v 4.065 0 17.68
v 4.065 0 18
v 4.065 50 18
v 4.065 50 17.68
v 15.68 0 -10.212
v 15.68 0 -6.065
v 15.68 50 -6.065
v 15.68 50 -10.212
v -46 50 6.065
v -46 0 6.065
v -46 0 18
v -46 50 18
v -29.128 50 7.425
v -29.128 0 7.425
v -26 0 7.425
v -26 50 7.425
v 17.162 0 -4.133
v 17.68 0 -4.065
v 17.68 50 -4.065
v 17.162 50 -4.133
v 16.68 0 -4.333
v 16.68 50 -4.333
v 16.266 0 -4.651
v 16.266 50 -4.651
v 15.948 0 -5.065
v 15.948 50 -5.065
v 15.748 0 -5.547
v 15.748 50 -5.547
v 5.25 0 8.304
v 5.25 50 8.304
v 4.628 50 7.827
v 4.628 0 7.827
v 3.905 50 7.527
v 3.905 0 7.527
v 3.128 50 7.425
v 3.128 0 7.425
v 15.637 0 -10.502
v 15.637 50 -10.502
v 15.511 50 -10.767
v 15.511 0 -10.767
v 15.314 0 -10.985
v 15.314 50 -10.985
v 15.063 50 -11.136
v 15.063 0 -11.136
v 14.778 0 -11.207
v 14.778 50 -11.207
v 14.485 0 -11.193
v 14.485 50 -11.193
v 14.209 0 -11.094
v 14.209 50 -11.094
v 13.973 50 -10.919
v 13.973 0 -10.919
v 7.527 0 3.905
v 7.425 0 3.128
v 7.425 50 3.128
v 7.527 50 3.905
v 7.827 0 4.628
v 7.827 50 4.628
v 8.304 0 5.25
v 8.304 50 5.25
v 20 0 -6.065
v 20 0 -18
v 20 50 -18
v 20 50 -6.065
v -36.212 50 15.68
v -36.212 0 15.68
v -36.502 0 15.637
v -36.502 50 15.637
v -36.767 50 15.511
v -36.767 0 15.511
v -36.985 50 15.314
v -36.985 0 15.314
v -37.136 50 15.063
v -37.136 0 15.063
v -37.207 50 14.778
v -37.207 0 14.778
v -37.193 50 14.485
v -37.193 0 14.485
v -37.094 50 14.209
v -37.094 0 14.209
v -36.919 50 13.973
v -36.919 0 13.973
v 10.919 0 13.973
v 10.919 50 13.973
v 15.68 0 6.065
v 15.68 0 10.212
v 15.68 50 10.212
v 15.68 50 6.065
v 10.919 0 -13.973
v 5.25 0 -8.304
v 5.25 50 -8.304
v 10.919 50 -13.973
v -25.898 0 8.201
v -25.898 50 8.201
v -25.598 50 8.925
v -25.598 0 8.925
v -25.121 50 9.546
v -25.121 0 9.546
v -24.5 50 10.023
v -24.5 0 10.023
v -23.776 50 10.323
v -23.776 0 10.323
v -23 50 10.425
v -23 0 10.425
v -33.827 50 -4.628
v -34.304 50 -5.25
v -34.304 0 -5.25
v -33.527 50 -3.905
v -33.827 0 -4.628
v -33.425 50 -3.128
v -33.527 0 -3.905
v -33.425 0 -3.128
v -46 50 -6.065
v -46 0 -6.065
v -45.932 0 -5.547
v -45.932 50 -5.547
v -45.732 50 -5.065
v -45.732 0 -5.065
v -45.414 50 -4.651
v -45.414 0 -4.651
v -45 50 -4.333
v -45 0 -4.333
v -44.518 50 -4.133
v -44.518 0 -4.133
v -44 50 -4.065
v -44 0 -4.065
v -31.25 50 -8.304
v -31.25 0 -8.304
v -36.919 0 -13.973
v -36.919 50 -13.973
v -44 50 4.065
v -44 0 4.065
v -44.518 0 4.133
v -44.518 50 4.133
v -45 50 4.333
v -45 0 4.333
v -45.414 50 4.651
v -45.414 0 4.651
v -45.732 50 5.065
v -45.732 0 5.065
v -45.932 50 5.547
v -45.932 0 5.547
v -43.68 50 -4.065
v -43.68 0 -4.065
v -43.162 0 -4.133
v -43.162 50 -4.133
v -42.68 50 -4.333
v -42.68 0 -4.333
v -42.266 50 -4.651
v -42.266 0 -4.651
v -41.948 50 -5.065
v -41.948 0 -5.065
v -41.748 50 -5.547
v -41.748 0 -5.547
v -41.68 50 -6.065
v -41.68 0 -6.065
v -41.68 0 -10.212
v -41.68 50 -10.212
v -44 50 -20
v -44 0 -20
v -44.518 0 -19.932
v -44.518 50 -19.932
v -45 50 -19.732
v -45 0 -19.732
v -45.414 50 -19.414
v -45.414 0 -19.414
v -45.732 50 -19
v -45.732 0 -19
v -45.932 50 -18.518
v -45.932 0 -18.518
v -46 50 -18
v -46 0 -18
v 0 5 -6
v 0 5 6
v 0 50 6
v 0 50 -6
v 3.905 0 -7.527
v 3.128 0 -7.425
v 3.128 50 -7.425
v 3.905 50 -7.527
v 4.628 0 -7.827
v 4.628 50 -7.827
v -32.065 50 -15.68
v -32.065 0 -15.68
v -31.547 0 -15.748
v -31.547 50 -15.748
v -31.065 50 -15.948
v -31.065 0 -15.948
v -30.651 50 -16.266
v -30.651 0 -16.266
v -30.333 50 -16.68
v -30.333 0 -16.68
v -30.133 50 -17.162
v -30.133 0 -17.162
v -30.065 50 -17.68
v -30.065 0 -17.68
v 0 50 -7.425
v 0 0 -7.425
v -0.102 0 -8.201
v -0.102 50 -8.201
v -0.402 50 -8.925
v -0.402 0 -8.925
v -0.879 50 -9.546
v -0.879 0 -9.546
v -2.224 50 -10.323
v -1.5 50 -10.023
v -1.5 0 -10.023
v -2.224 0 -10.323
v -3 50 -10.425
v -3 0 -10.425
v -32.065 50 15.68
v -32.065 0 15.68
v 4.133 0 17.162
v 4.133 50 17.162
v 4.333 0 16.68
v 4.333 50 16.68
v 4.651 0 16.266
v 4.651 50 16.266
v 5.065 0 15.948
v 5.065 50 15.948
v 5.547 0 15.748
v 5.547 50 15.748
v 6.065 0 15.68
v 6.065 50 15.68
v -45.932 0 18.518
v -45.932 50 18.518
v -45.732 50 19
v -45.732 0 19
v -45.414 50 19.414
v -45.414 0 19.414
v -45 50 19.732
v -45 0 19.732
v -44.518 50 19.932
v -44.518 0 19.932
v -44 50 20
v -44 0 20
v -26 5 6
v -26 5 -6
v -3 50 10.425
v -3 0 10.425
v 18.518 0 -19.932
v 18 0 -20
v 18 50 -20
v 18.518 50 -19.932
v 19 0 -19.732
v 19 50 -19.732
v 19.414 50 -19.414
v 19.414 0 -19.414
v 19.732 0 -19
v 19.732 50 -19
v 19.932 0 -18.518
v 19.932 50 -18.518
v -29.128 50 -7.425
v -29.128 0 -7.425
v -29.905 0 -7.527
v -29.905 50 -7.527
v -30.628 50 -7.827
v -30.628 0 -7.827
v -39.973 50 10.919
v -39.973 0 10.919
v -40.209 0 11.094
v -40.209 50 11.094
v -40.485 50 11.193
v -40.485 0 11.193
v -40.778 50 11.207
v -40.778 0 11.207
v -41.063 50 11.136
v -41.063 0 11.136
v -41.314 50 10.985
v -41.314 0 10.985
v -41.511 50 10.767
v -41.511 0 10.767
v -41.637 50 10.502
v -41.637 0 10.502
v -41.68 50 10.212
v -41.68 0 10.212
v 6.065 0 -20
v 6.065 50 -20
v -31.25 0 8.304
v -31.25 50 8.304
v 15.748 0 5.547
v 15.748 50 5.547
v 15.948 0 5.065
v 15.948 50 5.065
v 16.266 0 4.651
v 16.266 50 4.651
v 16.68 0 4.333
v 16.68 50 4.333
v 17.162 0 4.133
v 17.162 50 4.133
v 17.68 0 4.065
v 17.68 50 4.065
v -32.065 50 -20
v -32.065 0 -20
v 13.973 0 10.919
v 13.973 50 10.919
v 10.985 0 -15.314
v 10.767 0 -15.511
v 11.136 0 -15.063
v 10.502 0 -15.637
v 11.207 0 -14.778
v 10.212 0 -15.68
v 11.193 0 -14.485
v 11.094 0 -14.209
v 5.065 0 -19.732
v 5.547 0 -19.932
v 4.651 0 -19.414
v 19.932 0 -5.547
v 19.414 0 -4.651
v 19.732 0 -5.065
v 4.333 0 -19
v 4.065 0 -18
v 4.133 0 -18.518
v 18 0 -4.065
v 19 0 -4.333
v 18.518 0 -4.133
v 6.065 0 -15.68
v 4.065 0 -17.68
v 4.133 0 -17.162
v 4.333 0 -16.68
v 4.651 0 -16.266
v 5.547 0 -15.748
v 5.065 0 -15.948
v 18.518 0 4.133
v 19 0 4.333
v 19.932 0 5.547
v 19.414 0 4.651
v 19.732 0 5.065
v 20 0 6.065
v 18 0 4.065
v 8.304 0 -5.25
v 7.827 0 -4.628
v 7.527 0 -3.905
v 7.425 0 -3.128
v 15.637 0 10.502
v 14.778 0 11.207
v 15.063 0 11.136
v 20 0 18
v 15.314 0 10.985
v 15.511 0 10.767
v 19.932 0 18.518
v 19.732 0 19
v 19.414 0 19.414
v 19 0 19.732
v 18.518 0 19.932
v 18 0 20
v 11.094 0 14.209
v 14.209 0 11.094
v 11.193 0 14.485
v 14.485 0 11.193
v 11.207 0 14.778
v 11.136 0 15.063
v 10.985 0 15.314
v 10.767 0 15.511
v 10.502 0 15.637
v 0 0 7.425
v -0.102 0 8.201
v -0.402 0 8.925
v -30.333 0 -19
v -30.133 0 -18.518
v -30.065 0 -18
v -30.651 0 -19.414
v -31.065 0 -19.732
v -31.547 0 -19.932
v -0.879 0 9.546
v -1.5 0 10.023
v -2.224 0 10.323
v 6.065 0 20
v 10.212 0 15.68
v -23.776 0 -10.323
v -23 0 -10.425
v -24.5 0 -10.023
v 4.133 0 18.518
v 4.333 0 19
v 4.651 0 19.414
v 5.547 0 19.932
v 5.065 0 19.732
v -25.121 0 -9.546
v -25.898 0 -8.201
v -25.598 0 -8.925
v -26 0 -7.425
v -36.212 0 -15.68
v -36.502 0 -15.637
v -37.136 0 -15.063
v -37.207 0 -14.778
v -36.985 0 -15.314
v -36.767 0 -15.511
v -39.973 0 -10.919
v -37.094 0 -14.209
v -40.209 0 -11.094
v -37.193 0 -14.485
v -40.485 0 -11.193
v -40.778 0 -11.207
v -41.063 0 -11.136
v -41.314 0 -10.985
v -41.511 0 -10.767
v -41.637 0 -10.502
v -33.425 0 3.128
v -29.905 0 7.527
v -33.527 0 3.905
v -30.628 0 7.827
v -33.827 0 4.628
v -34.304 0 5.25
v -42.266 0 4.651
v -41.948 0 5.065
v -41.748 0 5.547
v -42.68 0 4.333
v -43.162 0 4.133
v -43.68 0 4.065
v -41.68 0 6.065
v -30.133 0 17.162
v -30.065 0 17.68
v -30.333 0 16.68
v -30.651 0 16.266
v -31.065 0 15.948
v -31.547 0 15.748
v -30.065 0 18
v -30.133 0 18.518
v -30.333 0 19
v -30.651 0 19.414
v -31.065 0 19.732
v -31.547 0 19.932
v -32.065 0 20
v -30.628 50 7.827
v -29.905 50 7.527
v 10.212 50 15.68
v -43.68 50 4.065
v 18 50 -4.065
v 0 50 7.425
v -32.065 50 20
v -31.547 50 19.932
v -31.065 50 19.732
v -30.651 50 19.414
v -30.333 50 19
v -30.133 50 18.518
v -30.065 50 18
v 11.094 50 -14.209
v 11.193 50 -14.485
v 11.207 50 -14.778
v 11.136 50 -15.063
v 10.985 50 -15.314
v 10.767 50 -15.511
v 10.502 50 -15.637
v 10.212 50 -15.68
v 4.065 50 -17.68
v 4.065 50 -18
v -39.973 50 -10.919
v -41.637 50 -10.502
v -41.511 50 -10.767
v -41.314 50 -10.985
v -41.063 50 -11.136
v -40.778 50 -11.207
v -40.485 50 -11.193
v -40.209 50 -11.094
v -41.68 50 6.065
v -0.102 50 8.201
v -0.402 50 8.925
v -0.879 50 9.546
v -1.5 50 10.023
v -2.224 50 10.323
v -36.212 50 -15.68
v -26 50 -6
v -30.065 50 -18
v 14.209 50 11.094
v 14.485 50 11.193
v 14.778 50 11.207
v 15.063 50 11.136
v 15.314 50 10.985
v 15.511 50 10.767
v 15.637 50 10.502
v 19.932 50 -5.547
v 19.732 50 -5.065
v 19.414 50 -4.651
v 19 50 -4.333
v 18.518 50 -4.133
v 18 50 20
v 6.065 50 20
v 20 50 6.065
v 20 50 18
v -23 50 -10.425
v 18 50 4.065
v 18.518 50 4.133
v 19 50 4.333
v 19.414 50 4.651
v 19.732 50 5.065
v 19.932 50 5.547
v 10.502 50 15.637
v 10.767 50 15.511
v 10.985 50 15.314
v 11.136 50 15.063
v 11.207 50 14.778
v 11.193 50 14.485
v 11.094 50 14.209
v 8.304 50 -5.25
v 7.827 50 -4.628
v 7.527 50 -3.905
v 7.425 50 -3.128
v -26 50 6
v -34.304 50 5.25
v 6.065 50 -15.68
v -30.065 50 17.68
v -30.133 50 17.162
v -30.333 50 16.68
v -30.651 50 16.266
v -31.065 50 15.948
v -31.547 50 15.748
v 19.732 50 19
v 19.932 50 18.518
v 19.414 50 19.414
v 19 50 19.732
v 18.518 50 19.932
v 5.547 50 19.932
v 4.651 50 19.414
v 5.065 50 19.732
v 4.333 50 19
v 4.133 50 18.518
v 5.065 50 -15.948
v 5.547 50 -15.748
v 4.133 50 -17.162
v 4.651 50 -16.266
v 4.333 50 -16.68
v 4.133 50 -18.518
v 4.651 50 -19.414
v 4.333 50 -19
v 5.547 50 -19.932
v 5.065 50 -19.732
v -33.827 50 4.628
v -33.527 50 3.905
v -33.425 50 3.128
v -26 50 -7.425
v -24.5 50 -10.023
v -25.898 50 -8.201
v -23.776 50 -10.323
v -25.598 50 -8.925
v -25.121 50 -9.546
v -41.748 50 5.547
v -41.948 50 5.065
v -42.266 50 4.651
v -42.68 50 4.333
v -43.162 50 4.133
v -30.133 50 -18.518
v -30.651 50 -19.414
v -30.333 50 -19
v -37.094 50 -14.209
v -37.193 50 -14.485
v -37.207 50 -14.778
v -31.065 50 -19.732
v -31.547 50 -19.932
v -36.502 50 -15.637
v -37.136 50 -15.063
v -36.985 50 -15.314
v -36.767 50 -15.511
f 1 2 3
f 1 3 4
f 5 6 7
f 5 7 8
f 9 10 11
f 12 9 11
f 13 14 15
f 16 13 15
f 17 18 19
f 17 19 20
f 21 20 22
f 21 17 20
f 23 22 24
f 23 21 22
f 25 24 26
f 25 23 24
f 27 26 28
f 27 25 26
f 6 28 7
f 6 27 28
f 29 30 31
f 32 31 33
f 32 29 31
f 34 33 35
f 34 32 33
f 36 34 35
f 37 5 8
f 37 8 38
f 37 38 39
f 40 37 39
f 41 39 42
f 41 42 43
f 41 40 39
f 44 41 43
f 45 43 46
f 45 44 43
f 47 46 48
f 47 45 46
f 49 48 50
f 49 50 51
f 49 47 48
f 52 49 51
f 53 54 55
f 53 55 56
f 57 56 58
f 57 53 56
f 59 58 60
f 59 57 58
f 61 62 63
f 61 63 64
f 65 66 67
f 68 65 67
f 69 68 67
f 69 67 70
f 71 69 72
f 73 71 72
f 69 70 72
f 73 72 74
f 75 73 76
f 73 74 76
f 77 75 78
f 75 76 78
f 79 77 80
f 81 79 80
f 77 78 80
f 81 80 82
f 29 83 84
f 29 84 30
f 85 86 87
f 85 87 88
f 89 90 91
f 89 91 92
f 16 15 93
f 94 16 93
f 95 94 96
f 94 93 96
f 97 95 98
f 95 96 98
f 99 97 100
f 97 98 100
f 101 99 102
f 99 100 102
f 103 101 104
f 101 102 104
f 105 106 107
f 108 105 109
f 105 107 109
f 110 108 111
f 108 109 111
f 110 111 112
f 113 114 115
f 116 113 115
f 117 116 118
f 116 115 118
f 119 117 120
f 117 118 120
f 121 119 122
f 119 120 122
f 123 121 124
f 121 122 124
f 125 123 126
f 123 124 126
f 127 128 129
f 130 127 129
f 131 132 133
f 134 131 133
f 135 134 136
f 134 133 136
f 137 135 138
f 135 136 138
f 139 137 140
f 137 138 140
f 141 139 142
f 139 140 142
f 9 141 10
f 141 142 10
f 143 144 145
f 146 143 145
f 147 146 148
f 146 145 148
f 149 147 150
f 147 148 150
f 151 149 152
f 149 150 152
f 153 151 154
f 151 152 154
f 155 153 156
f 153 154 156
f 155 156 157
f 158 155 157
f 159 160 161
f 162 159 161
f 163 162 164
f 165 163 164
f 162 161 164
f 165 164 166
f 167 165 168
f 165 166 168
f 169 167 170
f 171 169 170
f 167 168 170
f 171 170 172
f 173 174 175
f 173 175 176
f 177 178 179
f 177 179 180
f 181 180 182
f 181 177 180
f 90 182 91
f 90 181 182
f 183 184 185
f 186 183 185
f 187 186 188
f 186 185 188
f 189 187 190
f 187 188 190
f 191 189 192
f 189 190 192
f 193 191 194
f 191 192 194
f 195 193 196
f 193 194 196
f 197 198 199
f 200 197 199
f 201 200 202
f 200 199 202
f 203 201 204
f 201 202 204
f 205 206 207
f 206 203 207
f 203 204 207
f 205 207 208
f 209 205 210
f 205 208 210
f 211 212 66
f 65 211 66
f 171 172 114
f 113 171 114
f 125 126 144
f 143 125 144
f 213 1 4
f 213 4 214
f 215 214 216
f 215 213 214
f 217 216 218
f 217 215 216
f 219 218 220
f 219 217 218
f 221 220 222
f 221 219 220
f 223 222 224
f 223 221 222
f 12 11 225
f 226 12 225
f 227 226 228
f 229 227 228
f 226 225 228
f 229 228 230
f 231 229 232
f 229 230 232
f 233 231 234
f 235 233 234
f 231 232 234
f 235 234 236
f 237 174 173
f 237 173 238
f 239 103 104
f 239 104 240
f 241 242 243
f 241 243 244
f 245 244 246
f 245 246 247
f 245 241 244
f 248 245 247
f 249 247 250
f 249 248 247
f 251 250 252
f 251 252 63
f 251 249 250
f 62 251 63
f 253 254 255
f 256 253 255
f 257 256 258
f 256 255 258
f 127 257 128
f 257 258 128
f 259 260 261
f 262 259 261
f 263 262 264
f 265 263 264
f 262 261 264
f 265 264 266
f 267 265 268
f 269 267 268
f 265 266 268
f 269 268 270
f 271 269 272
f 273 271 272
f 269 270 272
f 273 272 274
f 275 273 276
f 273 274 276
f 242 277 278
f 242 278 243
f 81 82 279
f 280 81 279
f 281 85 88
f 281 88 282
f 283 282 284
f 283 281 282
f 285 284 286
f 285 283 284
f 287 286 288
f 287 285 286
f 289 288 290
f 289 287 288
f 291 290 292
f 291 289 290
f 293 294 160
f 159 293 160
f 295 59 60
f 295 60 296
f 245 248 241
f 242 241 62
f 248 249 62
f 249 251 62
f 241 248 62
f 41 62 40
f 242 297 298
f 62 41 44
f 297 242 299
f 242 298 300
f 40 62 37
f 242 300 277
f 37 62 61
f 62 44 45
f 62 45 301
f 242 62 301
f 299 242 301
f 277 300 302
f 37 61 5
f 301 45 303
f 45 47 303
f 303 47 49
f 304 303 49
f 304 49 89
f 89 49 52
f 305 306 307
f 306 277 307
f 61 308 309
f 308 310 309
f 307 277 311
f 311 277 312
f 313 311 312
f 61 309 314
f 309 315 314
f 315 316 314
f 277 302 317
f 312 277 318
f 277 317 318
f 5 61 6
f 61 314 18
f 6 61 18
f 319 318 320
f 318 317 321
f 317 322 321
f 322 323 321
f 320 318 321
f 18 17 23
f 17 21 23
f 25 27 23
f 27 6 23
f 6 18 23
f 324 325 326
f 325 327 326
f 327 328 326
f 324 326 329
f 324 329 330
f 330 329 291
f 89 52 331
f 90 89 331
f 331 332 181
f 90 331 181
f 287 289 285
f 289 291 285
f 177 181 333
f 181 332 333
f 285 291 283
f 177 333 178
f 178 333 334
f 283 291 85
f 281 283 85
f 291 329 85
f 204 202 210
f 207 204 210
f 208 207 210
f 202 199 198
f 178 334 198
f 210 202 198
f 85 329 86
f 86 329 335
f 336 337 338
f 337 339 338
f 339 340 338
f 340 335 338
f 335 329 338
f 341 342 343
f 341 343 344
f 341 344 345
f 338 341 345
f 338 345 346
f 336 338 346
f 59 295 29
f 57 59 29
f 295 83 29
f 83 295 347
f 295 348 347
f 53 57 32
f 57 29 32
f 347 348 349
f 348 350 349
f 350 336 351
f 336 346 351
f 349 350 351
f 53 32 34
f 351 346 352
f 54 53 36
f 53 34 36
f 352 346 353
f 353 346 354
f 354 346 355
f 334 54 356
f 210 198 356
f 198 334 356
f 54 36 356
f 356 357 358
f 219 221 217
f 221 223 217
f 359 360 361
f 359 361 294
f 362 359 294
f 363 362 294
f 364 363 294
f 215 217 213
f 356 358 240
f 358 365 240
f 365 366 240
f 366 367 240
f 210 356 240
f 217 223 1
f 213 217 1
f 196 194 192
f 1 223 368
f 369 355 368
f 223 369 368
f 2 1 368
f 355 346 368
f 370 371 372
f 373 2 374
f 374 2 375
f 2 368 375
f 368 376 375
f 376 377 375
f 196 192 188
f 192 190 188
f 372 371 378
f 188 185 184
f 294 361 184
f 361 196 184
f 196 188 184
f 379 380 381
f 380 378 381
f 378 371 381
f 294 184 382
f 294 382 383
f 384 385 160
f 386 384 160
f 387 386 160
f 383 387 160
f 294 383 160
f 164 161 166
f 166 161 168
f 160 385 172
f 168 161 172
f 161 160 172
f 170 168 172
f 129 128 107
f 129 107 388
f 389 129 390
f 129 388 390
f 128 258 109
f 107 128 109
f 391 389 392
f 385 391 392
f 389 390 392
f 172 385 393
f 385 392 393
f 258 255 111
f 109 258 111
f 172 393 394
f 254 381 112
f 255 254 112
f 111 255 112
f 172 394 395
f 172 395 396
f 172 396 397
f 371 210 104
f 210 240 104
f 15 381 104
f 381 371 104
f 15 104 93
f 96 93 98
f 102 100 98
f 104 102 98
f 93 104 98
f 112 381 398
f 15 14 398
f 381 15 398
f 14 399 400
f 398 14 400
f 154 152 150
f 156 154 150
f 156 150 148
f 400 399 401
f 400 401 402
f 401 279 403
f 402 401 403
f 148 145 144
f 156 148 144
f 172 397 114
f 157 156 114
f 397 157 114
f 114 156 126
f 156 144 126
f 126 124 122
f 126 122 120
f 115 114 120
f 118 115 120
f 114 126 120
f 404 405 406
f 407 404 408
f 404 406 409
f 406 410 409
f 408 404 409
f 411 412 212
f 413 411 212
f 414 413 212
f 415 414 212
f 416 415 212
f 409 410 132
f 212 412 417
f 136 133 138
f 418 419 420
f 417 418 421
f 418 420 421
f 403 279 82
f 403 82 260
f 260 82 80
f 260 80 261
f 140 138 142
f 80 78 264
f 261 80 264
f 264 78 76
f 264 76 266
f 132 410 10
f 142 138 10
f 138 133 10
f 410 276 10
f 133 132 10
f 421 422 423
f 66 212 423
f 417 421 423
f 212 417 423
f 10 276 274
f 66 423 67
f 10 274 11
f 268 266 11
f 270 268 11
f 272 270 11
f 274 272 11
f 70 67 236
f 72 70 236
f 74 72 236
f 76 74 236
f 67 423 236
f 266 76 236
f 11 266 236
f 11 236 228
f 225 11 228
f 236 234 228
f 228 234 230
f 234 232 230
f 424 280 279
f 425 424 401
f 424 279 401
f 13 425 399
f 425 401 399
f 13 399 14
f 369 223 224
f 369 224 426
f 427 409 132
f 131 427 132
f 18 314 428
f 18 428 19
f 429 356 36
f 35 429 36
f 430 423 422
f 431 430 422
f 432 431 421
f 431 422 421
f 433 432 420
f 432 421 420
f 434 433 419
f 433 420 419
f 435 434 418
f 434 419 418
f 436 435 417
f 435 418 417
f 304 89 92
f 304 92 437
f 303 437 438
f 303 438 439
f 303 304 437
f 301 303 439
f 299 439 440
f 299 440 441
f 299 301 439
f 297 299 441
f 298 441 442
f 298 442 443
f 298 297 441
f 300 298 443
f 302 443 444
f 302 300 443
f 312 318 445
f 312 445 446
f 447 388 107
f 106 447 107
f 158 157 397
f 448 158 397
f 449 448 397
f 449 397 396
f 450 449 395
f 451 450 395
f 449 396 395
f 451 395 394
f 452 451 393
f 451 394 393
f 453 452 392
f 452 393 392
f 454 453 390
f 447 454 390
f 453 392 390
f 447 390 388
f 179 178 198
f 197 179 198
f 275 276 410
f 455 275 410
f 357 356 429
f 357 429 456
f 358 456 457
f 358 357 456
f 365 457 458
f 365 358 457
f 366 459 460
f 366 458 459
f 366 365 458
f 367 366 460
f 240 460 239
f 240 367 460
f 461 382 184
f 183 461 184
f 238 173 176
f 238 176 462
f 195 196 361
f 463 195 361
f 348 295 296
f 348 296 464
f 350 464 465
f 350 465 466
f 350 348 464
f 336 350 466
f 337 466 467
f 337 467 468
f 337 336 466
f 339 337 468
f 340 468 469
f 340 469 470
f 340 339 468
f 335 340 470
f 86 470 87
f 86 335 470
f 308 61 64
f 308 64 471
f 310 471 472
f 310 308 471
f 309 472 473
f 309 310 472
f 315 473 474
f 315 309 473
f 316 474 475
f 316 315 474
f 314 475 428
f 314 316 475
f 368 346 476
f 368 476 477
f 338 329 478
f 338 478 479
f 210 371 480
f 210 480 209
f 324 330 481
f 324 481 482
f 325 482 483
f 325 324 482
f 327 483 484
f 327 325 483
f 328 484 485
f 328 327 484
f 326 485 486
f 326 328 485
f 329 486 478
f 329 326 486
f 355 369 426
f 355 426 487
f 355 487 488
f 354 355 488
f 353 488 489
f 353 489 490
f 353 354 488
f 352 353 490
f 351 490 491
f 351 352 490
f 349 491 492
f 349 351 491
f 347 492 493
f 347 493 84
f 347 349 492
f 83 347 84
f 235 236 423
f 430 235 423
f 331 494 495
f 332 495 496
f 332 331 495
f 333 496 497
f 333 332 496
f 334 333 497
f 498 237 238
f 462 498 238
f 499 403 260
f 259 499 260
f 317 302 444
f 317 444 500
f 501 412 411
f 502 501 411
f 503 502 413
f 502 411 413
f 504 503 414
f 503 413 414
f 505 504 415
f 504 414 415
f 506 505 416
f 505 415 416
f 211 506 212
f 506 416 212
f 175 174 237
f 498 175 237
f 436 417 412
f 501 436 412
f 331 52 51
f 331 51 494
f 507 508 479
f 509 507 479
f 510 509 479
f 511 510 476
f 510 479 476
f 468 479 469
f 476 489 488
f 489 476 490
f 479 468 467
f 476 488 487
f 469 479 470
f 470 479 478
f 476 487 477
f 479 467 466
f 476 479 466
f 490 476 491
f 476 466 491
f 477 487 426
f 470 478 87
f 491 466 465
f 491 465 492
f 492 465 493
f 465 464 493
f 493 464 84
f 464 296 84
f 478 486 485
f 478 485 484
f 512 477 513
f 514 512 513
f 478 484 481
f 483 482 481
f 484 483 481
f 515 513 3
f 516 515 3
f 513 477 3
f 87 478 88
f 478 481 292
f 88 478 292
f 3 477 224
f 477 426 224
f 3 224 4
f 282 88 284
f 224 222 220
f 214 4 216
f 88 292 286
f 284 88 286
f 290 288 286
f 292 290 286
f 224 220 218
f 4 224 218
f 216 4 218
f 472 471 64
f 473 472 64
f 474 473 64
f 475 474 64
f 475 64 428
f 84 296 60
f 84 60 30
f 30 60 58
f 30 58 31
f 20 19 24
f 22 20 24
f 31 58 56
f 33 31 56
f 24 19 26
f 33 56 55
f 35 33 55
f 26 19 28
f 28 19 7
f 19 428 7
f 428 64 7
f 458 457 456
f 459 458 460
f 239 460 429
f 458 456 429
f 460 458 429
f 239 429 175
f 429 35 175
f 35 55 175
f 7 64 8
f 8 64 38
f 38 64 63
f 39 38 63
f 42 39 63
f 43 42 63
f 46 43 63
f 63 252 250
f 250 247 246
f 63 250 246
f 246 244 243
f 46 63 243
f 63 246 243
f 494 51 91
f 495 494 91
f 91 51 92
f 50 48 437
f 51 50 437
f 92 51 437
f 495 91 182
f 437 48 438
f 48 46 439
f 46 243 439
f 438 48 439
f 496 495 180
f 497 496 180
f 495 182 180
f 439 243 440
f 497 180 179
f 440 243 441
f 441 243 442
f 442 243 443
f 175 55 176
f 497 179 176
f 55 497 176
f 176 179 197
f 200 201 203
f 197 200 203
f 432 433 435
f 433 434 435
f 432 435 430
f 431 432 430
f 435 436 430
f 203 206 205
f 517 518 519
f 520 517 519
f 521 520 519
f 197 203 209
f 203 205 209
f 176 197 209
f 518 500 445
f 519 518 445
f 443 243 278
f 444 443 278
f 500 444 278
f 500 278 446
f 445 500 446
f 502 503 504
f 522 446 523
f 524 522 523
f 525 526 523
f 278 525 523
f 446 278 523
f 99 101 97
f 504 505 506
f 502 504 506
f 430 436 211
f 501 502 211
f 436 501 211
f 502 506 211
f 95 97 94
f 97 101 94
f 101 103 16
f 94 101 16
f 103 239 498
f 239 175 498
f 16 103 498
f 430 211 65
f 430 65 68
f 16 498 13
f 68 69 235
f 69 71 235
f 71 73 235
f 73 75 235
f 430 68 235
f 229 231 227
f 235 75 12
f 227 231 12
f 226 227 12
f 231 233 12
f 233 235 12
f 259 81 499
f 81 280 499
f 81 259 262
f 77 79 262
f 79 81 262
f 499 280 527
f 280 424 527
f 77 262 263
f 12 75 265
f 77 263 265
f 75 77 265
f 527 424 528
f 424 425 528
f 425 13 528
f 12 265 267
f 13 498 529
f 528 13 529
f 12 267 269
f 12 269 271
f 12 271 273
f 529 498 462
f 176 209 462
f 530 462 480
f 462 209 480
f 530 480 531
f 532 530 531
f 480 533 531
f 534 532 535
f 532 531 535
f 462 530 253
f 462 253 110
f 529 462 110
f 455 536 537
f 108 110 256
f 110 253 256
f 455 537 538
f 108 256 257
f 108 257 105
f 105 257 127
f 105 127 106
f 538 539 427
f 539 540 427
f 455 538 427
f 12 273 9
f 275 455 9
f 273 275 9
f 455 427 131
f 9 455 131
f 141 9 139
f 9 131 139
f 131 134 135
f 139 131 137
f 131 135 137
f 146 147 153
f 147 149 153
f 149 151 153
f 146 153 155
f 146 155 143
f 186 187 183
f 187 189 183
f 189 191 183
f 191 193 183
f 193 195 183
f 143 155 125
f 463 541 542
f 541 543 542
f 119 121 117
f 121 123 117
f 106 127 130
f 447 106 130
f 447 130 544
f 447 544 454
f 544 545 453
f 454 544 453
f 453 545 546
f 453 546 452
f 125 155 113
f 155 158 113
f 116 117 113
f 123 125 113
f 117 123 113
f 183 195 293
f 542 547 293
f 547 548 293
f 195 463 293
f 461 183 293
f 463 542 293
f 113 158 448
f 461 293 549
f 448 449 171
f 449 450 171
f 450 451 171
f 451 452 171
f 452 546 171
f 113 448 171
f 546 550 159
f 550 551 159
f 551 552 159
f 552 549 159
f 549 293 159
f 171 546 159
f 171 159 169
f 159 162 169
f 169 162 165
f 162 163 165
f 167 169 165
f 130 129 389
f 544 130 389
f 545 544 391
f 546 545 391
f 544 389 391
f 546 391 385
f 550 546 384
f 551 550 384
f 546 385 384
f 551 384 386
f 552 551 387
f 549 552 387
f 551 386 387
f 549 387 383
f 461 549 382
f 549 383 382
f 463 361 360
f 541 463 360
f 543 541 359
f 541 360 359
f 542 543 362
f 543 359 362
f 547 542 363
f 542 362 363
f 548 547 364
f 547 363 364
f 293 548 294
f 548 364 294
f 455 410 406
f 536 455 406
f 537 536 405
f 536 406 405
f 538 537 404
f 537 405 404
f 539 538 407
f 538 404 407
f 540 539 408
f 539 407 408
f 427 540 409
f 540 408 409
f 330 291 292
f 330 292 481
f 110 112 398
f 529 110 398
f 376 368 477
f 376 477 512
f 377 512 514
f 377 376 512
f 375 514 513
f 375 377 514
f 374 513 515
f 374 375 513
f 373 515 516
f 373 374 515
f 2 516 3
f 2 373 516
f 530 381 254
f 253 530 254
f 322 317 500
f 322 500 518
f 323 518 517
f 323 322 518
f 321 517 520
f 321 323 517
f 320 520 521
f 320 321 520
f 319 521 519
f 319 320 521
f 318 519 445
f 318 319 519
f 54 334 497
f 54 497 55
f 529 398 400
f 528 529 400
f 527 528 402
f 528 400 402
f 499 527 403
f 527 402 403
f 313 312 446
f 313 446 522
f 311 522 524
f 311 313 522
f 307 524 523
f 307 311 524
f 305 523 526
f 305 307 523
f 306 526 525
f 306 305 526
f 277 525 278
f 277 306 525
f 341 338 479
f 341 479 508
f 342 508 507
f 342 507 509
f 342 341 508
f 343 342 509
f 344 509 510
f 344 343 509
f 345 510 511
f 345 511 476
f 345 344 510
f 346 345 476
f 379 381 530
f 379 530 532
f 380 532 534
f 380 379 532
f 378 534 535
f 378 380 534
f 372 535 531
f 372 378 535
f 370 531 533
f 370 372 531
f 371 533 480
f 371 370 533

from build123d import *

# Parameters (mm, degrees)
BOSS_EXTRUDE3_DEPTH = 50
SKETCH4_W           = 14.85
SKETCH4_H           = 5
BOSS_EXTRUDE4_DEPTH = 26
SKETCH6_W           = 26
SKETCH6_H           = 5
BOSS_EXTRUDE5_DEPTH = 3
SKETCH7_W           = 26
SKETCH7_H           = 5
BOSS_EXTRUDE6_DEPTH = 3
BOSS_EXTRUDE7_DEPTH = 45
CUT_EXTRUDE1_START  = -5
CUT_EXTRUDE1_DEPTH  = 5


with BuildPart() as part:
    # Sketch1 → Boss-Extrude3 (new body)
    with BuildSketch(Plane(origin=(0, 0, 0), x_dir=(1, 0, 0), z_dir=(0, 1, 0))):
        with BuildLine():
            ThreePointArc((4.065, -18), (4.650786438, -19.414213562), (6.065, -20))
            Line((6.065, -20), (18, -20))
            ThreePointArc((18, -20), (19.414213562, -19.414213562), (20, -18))
            Line((20, -18), (20, -15.68))
            Line((20, -15.68), (20, -6.065))
            ThreePointArc((20, -6.065), (19.414213562, -4.650786438), (18, -4.065))
            Line((18, -4.065), (17.68, -4.065))
            ThreePointArc((17.68, -4.065), (16.265786438, -4.650786438), (15.68, -6.065))
            Line((15.68, -6.065), (15.68, -10.211786438))
            ThreePointArc((15.68, -10.211786438), (15.062683432, -11.13566597), (13.972893219, -10.918893219))
            Line((13.972893219, -10.918893219), (8.303679656, -5.249679656))
            ThreePointArc((8.303679656, -5.249679656), (7.653361402, -4.27640961), (7.425, -3.128359313))
            Line((7.425, -3.128359313), (7.425, 3.128359313))
            ThreePointArc((7.425, 3.128359313), (7.653361402, 4.27640961), (8.303679656, 5.249679656))
            Line((8.303679656, 5.249679656), (13.972893219, 10.918893219))
            ThreePointArc((13.972893219, 10.918893219), (15.062683432, 11.13566597), (15.68, 10.211786438))
            Line((15.68, 10.211786438), (15.68, 6.065))
            ThreePointArc((15.68, 6.065), (16.265786438, 4.650786438), (17.68, 4.065))
            Line((17.68, 4.065), (18, 4.065))
            ThreePointArc((18, 4.065), (19.414213562, 4.650786438), (20, 6.065))
            Line((20, 6.065), (20, 18))
            ThreePointArc((20, 18), (19.414213562, 19.414213562), (18, 20))
            Line((18, 20), (6.065, 20))
            ThreePointArc((6.065, 20), (4.650786438, 19.414213562), (4.065, 18))
            Line((4.065, 18), (4.065, 17.68))
            ThreePointArc((4.065, 17.68), (4.650786438, 16.265786438), (6.065, 15.68))
            Line((6.065, 15.68), (10.211786438, 15.68))
            ThreePointArc((10.211786438, 15.68), (11.13566597, 15.062683432), (10.918893219, 13.972893219))
            Line((10.918893219, 13.972893219), (5.249679656, 8.303679656))
            ThreePointArc((5.249679656, 8.303679656), (4.27640961, 7.653361402), (3.128359313, 7.425))
            Line((3.128359313, 7.425), (0, 7.425))
            Line((0, 7.425), (0, -7.425))
            Line((0, -7.425), (3.128359313, -7.425))
            ThreePointArc((3.128359313, -7.425), (4.27640961, -7.653361402), (5.249679656, -8.303679656))
            Line((5.249679656, -8.303679656), (10.918893219, -13.972893219))
            ThreePointArc((10.918893219, -13.972893219), (11.13566597, -15.062683432), (10.211786438, -15.68))
            Line((10.211786438, -15.68), (6.065, -15.68))
            ThreePointArc((6.065, -15.68), (4.650786438, -16.265786438), (4.065, -17.68))
            Line((4.065, -17.68), (4.065, -18))
        make_face()
    boss_extrude3 = extrude(amount=BOSS_EXTRUDE3_DEPTH)

    # Sketch4 → Boss-Extrude4 (add)
    with BuildSketch(Plane.ZY):
        with Locations((0, 2.5)):
            Rectangle(SKETCH4_W, SKETCH4_H)
    extrude(amount=BOSS_EXTRUDE4_DEPTH)

    # Mirror2: Boss-Extrude3 across plane
    add(boss_extrude3.mirror(Plane.ZY.offset(13)))

    # Sketch6 → Boss-Extrude5 (add)
    with BuildSketch(Plane.XY.offset(7.425)):
        with Locations((-13, 2.5)):
            Rectangle(SKETCH6_W, SKETCH6_H)
    extrude(amount=BOSS_EXTRUDE5_DEPTH)

    # Sketch7 → Boss-Extrude6 (add)
    with BuildSketch(Plane(origin=(0, 0, -7.425), x_dir=(-1, 0, 0), z_dir=(0, 0, -1))):
        with Locations((13, 2.5)):
            Rectangle(SKETCH7_W, SKETCH7_H)
    extrude(amount=BOSS_EXTRUDE6_DEPTH)

    # Sketch8 → Boss-Extrude7 (add)
    with BuildSketch(Plane(origin=(0, 5, 0), x_dir=(1, 0, 0), z_dir=(0, 1, 0))):
        with BuildLine():
            Line((-3, 10.425), (-23, 10.425))
            ThreePointArc((-23, 10.425), (-25.121320344, 9.546320344), (-26, 7.425))
            Line((-26, 7.425), (-26, 6))
            Line((-26, 6), (0, 6))
            Line((0, 6), (0, 7.425))
            ThreePointArc((0, 7.425), (-0.878679656, 9.546320344), (-3, 10.425))
        make_face()
        with BuildLine():
            Line((0, -7.425), (0, -6))
            Line((0, -6), (-26, -6))
            Line((-26, -6), (-26, -7.425))
            ThreePointArc((-26, -7.425), (-25.121320344, -9.546320344), (-23, -10.425))
            Line((-23, -10.425), (-3, -10.425))
            ThreePointArc((-3, -10.425), (-0.878679656, -9.546320344), (0, -7.425))
        make_face()
    extrude(amount=BOSS_EXTRUDE7_DEPTH)

    # Sketch9 → Cut-Extrude1 (cut)
    with BuildSketch(Plane(origin=(0, 5, 0), x_dir=(1, 0, 0), z_dir=(0, 1, 0)).offset(CUT_EXTRUDE1_START)):
        with BuildLine():
            ThreePointArc((0, -7.425), (-0.878679656, -9.546320344), (-3, -10.425))
            Line((-3, -10.425), (0, -10.425))
            Line((0, -10.425), (0, -7.425))
        make_face()
        with BuildLine():
            Line((-26, -7.425), (-26, -10.425))
            Line((-26, -10.425), (-23, -10.425))
            ThreePointArc((-23, -10.425), (-25.121320344, -9.546320344), (-26, -7.425))
        make_face()
        with BuildLine():
            Line((0, 7.425), (0, 10.425))
            Line((0, 10.425), (-3, 10.425))
            ThreePointArc((-3, 10.425), (-0.878679656, 9.546320344), (0, 7.425))
        make_face()
        with BuildLine():
            ThreePointArc((-26, 7.425), (-25.121320344, 9.546320344), (-23, 10.425))
            Line((-23, 10.425), (-26, 10.425))
            Line((-26, 10.425), (-26, 7.425))
        make_face()
    extrude(amount=CUT_EXTRUDE1_DEPTH, mode=Mode.SUBTRACT)


solid = part.part
